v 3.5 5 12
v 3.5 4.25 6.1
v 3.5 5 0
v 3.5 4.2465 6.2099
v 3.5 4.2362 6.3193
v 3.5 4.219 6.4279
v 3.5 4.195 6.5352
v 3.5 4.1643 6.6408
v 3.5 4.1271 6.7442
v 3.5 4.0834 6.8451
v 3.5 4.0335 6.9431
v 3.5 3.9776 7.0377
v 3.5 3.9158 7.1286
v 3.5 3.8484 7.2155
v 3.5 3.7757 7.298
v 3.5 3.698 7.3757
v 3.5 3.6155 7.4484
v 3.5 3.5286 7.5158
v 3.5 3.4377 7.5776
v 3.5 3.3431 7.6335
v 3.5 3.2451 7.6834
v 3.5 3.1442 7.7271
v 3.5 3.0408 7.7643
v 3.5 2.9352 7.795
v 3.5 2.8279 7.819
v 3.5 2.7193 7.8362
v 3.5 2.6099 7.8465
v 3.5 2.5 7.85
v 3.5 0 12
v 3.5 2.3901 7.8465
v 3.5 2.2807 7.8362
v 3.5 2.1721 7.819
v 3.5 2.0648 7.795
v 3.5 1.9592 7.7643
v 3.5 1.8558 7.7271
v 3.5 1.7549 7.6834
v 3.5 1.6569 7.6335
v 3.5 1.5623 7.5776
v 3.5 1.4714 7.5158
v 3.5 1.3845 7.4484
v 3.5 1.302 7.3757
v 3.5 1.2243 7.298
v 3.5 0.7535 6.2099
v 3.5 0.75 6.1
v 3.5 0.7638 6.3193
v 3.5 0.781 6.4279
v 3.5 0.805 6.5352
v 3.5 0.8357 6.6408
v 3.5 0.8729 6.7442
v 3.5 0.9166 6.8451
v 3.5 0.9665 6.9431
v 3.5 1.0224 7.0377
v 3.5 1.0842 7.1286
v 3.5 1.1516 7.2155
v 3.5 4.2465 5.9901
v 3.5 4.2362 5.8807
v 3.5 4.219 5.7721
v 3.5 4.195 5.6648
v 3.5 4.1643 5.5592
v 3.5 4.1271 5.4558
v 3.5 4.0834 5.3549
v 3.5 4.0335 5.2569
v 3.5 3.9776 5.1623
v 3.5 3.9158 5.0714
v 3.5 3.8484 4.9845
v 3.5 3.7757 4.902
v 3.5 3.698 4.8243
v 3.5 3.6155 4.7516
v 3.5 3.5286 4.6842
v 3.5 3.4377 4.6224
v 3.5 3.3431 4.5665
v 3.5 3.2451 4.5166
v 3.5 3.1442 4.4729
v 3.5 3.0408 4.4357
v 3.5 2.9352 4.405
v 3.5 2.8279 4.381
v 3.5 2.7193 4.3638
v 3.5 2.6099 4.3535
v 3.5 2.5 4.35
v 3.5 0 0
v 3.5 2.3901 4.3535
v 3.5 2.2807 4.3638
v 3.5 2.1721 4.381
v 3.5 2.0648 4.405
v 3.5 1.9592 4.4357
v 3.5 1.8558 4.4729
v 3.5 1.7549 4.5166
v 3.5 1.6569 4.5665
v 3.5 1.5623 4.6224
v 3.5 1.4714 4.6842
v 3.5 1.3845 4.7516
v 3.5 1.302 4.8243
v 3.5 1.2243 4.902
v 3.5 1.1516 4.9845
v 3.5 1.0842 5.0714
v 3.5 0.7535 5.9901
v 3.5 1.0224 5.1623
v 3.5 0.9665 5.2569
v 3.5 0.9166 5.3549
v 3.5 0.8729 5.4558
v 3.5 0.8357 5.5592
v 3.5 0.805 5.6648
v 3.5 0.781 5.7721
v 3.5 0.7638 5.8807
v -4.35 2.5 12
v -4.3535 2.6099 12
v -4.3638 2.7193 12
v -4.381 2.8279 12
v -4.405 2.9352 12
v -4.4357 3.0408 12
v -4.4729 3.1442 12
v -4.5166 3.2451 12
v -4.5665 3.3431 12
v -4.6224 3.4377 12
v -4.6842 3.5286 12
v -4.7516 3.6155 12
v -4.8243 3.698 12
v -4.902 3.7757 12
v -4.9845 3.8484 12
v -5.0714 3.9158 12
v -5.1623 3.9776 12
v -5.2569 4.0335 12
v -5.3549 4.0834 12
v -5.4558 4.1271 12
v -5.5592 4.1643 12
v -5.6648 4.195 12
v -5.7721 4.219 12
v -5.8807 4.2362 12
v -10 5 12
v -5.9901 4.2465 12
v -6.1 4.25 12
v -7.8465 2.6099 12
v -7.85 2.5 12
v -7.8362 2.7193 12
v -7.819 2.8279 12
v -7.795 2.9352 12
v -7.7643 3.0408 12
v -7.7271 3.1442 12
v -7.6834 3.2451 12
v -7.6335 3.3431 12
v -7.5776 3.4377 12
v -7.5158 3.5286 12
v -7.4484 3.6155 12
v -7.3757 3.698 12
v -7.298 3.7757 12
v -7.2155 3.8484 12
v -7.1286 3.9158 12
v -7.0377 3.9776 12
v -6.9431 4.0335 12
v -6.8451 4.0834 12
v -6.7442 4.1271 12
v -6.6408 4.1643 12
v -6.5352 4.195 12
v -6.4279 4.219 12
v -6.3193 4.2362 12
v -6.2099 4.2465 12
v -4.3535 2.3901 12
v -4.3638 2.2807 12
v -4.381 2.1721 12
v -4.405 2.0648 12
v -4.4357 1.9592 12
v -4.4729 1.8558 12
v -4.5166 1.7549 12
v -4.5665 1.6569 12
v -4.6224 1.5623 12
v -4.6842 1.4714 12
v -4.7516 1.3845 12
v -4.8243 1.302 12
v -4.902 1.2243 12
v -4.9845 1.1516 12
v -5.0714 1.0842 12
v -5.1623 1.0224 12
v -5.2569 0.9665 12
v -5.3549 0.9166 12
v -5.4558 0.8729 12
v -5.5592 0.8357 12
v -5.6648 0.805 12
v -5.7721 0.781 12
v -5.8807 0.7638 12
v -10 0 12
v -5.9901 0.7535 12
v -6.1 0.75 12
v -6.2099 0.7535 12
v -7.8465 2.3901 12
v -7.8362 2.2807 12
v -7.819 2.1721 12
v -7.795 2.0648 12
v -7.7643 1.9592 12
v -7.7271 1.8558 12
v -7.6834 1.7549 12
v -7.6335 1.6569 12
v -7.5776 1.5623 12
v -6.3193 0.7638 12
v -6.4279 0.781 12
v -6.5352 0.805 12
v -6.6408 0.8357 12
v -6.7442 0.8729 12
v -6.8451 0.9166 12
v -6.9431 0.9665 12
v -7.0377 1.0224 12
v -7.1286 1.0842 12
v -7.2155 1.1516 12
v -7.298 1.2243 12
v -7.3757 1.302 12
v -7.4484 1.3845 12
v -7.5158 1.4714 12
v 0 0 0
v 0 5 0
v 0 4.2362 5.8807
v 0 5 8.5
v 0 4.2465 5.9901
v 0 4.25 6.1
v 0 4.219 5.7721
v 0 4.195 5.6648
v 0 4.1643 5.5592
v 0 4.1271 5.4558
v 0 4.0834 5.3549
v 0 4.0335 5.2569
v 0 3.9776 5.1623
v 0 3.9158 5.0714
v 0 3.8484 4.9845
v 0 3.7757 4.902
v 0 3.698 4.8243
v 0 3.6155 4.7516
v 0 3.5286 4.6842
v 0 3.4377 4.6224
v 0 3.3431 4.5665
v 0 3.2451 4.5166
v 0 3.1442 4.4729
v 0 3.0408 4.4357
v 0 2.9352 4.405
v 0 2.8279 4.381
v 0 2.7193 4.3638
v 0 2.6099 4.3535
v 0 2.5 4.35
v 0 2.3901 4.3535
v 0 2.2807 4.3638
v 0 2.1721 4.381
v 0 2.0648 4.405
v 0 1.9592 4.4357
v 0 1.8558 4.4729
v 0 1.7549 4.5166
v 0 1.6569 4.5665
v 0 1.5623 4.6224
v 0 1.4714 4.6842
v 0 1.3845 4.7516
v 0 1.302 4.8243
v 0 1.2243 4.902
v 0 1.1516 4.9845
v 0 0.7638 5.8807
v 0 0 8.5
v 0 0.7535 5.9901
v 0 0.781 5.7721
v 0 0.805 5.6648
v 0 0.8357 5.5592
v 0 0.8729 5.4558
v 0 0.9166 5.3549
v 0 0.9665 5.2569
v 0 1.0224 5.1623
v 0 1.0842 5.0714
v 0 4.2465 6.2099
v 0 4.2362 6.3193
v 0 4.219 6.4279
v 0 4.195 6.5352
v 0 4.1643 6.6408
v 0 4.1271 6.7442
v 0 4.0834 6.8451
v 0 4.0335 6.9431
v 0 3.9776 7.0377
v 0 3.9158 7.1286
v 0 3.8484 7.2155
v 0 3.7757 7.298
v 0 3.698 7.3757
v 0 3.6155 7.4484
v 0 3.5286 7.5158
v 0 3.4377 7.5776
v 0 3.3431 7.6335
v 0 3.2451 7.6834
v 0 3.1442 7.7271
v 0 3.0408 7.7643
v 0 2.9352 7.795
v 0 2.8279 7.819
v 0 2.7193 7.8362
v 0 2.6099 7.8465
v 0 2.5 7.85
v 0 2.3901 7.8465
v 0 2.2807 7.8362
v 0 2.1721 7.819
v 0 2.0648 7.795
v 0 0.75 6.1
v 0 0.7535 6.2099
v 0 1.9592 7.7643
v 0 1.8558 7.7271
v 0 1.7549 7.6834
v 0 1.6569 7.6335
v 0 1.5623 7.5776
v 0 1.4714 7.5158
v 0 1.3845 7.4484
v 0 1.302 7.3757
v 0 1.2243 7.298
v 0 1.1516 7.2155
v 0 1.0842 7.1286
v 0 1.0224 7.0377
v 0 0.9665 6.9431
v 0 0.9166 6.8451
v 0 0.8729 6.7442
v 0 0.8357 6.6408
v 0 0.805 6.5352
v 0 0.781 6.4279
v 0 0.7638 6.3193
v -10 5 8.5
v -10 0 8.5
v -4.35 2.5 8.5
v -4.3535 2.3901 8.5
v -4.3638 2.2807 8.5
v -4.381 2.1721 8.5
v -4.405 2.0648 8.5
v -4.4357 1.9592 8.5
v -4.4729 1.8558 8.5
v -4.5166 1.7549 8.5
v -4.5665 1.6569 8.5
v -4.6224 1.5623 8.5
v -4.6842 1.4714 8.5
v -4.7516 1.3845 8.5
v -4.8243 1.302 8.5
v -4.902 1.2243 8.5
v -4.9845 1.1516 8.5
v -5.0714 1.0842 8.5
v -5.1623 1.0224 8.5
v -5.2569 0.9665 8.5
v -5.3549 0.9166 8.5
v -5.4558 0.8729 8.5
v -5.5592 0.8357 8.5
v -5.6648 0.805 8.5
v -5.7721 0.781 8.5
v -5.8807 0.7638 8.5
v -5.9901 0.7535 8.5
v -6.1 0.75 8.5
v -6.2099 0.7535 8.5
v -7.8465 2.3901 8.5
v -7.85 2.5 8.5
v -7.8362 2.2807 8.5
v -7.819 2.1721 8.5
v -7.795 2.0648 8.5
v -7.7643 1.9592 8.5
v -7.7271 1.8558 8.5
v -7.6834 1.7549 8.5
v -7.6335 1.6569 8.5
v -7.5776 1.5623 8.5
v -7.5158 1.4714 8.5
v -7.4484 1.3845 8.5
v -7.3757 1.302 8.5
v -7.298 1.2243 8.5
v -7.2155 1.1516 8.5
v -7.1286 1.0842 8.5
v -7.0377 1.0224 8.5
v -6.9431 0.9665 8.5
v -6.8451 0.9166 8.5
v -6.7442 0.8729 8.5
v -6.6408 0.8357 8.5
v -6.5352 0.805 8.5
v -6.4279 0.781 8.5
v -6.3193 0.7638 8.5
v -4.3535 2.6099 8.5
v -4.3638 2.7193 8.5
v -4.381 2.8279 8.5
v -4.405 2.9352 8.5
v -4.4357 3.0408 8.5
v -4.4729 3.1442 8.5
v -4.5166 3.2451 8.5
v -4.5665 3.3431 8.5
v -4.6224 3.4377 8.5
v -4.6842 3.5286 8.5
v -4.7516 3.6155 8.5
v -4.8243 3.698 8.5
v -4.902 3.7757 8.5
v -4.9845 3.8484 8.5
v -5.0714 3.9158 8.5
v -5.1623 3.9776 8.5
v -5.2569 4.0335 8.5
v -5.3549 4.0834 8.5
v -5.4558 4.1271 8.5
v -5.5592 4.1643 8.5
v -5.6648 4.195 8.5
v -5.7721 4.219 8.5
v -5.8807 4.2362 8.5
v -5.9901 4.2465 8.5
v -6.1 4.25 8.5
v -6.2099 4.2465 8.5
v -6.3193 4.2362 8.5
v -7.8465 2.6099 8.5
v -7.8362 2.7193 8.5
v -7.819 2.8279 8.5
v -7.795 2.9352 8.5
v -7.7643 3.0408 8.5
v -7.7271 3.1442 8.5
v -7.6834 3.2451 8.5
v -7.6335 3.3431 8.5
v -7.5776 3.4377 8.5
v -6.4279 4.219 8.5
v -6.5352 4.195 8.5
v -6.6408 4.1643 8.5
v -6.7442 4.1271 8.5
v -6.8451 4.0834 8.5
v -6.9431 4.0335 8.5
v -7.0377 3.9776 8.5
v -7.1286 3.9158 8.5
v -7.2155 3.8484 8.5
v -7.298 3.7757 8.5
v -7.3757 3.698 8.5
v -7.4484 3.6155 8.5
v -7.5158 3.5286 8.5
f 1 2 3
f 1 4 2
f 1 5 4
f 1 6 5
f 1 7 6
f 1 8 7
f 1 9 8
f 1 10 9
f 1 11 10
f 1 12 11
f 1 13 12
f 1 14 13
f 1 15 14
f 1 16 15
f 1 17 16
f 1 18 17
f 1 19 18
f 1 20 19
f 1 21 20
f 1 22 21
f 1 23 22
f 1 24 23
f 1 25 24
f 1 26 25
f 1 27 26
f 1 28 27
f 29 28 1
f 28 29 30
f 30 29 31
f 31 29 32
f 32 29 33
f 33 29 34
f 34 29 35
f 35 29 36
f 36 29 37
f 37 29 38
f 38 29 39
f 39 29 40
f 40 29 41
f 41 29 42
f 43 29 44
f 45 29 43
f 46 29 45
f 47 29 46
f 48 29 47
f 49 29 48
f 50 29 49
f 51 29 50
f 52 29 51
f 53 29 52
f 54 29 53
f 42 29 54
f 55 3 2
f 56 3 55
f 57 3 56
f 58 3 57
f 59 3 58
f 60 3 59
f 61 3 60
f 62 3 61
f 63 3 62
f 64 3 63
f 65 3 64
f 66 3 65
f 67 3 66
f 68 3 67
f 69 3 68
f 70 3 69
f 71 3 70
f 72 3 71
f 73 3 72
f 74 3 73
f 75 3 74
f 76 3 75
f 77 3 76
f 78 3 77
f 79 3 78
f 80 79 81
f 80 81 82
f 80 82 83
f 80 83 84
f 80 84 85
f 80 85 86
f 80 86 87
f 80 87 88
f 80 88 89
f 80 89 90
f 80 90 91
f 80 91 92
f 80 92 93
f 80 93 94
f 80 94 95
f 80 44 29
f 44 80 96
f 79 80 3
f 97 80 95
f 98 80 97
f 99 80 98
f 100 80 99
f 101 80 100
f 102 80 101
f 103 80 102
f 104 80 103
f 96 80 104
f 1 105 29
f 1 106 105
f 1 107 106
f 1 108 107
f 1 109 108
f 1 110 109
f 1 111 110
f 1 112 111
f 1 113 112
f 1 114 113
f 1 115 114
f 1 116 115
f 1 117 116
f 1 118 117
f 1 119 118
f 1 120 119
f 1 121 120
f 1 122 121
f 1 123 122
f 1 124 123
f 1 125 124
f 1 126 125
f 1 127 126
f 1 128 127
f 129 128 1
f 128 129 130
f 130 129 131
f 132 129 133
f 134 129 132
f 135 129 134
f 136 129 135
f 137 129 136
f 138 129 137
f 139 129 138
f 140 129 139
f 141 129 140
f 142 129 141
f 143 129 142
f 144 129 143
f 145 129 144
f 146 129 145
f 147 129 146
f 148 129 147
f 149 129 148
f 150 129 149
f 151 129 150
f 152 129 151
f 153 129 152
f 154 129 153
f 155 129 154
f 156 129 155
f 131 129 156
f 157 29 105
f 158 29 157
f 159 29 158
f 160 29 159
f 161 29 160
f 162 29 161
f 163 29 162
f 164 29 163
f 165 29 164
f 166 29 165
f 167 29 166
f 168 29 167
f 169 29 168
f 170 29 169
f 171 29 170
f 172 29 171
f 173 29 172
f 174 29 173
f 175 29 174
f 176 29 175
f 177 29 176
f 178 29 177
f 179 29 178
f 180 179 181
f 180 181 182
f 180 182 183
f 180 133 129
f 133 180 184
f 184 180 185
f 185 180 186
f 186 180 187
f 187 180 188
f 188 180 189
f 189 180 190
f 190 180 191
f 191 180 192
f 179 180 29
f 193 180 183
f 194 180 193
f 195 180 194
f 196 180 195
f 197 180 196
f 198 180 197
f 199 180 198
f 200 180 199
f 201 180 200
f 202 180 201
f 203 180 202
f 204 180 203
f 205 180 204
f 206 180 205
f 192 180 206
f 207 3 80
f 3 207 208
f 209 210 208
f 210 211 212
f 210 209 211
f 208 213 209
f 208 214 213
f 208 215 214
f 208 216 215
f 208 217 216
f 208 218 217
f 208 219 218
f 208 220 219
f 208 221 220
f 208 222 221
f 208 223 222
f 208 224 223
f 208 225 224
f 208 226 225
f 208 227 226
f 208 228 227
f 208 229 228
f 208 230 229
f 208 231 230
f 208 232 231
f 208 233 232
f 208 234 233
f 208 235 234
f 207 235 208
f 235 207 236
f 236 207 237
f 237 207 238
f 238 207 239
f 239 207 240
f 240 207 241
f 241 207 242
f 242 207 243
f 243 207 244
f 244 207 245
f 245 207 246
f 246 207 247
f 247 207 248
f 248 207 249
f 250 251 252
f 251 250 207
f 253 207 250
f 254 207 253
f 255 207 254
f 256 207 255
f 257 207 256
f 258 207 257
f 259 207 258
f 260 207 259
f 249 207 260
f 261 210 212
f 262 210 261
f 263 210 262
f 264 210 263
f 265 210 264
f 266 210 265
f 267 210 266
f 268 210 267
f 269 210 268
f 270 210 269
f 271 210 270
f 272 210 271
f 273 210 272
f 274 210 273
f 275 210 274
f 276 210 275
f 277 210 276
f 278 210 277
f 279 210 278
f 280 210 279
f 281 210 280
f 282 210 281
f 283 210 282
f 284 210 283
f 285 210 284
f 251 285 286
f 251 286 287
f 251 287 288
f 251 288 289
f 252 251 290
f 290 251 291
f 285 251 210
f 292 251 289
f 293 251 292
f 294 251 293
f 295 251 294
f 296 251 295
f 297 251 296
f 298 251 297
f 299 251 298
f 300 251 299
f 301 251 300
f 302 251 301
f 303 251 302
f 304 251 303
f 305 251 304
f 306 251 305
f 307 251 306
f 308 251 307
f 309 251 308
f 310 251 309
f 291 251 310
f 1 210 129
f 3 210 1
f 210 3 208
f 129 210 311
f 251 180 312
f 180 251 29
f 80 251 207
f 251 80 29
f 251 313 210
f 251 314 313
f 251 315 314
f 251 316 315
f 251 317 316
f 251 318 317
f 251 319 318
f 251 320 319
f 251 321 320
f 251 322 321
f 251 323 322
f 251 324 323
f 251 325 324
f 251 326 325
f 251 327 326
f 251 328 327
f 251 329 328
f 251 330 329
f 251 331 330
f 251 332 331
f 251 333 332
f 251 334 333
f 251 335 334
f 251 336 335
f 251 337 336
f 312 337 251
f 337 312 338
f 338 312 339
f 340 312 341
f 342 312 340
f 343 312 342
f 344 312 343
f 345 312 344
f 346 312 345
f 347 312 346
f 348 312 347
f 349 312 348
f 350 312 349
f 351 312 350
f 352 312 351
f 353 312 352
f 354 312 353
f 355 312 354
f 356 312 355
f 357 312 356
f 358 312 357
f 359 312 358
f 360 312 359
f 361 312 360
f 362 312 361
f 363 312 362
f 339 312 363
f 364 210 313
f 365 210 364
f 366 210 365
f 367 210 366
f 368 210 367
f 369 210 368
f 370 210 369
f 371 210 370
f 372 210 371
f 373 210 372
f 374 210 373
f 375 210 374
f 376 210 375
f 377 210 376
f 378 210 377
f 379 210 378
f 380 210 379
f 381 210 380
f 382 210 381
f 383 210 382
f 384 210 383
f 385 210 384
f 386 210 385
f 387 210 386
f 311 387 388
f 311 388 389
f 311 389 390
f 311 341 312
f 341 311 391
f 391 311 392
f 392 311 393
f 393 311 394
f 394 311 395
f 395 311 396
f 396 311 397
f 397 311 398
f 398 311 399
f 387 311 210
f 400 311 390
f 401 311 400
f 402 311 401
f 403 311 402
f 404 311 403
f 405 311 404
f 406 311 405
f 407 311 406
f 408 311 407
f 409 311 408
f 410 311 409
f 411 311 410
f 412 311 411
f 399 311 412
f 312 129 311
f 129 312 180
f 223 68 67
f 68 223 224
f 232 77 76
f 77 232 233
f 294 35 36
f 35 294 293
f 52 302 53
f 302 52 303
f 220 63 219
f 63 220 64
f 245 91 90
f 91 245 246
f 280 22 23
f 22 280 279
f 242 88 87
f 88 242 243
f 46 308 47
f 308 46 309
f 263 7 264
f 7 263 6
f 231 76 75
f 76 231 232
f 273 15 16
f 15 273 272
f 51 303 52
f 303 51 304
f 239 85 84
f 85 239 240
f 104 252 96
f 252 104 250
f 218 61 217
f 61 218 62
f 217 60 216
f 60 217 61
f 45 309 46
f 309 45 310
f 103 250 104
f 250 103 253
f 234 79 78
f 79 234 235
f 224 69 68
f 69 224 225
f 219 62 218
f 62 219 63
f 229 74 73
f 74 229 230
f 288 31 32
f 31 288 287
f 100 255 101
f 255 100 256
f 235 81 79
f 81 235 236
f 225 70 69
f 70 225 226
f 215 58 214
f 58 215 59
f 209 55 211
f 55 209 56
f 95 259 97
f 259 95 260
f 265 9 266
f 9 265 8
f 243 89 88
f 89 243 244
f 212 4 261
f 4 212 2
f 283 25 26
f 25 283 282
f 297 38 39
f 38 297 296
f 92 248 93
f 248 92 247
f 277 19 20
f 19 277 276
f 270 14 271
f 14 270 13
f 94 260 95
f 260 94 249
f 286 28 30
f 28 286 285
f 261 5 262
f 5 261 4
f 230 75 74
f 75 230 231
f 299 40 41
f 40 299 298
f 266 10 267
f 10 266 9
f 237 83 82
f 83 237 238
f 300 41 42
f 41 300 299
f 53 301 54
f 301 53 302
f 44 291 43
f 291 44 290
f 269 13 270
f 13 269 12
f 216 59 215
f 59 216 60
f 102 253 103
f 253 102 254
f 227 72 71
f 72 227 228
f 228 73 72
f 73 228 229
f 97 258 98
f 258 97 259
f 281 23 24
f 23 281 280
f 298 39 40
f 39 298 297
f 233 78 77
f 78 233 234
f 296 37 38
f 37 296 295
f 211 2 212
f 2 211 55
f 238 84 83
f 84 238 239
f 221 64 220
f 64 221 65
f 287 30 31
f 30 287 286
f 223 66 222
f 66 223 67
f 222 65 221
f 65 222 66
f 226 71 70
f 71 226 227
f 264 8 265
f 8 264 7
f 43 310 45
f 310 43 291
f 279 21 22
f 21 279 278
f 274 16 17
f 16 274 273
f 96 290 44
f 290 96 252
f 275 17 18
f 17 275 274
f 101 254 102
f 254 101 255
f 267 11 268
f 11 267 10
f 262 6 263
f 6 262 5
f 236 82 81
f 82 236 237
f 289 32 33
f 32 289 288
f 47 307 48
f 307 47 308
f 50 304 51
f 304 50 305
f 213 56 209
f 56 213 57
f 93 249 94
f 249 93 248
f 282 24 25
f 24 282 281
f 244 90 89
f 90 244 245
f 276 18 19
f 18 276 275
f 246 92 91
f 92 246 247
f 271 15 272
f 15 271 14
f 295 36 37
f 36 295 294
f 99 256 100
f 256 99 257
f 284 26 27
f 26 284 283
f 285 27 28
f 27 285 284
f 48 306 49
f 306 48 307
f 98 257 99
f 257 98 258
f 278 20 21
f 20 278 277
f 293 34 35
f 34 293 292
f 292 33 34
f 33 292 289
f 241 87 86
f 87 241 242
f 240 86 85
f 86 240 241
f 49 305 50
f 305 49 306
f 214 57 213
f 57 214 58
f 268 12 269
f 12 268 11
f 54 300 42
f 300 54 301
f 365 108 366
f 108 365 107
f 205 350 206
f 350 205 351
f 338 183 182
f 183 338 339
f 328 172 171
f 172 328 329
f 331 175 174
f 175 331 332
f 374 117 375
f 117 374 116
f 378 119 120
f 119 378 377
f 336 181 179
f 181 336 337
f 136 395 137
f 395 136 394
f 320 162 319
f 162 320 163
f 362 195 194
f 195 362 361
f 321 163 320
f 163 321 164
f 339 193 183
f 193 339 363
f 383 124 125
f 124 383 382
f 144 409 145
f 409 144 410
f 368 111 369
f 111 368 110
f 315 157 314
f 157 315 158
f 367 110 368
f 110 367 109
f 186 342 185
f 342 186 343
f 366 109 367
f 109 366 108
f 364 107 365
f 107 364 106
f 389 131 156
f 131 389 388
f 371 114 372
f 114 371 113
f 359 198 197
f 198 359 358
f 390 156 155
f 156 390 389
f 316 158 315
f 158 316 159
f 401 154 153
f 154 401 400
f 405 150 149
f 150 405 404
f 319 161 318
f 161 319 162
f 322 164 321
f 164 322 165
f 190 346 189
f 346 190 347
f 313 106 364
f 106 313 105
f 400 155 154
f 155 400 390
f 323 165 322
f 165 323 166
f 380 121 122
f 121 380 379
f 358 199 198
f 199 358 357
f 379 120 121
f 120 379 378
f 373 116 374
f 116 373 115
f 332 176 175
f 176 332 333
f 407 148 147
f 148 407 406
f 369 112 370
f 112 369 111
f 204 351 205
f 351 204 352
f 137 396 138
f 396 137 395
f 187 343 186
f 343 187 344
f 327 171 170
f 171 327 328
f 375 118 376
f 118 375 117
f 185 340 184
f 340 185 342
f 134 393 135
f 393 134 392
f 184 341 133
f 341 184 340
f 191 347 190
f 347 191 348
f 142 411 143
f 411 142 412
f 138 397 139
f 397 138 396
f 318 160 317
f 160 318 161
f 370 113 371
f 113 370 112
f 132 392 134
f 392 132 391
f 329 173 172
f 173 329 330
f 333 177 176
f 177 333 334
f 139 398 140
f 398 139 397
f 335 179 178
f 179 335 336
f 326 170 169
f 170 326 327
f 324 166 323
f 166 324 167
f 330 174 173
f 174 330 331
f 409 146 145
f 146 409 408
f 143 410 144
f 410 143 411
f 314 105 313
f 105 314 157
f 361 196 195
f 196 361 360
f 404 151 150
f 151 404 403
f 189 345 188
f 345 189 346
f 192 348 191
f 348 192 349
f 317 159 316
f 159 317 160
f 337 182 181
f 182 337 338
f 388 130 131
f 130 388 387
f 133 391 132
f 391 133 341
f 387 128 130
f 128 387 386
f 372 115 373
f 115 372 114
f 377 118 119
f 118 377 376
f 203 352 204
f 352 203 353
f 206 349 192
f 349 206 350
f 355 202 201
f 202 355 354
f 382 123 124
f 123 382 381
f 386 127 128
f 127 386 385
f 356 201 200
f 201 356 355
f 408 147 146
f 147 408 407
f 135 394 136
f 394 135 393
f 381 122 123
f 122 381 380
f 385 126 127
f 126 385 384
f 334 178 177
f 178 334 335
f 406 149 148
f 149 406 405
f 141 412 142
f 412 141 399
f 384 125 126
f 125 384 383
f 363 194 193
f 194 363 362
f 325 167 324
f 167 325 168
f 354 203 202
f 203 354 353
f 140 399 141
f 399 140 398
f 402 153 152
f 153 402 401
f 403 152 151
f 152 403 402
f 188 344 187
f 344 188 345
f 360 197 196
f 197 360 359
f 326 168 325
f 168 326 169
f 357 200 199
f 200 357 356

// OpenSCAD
/*
    Sachisti - Stopar 2.GEN - SG90 servo holder
    ©TechniX_SK & Sachisti 2019
*/

difference() {
    holder();
    holes();
}

module holder() {
    translate([0, 0, 0])
        cube([3.5, 5, 12]);
    translate([-10, 0, 8.5])
        cube([12, 5, 3.5]);
}

module holes() { 
    rotate([0, 90, 0])
        translate([-6.1, 2.5, -0.1])
            cylinder(h=3.7, d=3.5, $fn=100);
    translate([-6.1, 2.5, 8.4])
            cylinder(h=3.7, d=3.5, $fn=100);
}
